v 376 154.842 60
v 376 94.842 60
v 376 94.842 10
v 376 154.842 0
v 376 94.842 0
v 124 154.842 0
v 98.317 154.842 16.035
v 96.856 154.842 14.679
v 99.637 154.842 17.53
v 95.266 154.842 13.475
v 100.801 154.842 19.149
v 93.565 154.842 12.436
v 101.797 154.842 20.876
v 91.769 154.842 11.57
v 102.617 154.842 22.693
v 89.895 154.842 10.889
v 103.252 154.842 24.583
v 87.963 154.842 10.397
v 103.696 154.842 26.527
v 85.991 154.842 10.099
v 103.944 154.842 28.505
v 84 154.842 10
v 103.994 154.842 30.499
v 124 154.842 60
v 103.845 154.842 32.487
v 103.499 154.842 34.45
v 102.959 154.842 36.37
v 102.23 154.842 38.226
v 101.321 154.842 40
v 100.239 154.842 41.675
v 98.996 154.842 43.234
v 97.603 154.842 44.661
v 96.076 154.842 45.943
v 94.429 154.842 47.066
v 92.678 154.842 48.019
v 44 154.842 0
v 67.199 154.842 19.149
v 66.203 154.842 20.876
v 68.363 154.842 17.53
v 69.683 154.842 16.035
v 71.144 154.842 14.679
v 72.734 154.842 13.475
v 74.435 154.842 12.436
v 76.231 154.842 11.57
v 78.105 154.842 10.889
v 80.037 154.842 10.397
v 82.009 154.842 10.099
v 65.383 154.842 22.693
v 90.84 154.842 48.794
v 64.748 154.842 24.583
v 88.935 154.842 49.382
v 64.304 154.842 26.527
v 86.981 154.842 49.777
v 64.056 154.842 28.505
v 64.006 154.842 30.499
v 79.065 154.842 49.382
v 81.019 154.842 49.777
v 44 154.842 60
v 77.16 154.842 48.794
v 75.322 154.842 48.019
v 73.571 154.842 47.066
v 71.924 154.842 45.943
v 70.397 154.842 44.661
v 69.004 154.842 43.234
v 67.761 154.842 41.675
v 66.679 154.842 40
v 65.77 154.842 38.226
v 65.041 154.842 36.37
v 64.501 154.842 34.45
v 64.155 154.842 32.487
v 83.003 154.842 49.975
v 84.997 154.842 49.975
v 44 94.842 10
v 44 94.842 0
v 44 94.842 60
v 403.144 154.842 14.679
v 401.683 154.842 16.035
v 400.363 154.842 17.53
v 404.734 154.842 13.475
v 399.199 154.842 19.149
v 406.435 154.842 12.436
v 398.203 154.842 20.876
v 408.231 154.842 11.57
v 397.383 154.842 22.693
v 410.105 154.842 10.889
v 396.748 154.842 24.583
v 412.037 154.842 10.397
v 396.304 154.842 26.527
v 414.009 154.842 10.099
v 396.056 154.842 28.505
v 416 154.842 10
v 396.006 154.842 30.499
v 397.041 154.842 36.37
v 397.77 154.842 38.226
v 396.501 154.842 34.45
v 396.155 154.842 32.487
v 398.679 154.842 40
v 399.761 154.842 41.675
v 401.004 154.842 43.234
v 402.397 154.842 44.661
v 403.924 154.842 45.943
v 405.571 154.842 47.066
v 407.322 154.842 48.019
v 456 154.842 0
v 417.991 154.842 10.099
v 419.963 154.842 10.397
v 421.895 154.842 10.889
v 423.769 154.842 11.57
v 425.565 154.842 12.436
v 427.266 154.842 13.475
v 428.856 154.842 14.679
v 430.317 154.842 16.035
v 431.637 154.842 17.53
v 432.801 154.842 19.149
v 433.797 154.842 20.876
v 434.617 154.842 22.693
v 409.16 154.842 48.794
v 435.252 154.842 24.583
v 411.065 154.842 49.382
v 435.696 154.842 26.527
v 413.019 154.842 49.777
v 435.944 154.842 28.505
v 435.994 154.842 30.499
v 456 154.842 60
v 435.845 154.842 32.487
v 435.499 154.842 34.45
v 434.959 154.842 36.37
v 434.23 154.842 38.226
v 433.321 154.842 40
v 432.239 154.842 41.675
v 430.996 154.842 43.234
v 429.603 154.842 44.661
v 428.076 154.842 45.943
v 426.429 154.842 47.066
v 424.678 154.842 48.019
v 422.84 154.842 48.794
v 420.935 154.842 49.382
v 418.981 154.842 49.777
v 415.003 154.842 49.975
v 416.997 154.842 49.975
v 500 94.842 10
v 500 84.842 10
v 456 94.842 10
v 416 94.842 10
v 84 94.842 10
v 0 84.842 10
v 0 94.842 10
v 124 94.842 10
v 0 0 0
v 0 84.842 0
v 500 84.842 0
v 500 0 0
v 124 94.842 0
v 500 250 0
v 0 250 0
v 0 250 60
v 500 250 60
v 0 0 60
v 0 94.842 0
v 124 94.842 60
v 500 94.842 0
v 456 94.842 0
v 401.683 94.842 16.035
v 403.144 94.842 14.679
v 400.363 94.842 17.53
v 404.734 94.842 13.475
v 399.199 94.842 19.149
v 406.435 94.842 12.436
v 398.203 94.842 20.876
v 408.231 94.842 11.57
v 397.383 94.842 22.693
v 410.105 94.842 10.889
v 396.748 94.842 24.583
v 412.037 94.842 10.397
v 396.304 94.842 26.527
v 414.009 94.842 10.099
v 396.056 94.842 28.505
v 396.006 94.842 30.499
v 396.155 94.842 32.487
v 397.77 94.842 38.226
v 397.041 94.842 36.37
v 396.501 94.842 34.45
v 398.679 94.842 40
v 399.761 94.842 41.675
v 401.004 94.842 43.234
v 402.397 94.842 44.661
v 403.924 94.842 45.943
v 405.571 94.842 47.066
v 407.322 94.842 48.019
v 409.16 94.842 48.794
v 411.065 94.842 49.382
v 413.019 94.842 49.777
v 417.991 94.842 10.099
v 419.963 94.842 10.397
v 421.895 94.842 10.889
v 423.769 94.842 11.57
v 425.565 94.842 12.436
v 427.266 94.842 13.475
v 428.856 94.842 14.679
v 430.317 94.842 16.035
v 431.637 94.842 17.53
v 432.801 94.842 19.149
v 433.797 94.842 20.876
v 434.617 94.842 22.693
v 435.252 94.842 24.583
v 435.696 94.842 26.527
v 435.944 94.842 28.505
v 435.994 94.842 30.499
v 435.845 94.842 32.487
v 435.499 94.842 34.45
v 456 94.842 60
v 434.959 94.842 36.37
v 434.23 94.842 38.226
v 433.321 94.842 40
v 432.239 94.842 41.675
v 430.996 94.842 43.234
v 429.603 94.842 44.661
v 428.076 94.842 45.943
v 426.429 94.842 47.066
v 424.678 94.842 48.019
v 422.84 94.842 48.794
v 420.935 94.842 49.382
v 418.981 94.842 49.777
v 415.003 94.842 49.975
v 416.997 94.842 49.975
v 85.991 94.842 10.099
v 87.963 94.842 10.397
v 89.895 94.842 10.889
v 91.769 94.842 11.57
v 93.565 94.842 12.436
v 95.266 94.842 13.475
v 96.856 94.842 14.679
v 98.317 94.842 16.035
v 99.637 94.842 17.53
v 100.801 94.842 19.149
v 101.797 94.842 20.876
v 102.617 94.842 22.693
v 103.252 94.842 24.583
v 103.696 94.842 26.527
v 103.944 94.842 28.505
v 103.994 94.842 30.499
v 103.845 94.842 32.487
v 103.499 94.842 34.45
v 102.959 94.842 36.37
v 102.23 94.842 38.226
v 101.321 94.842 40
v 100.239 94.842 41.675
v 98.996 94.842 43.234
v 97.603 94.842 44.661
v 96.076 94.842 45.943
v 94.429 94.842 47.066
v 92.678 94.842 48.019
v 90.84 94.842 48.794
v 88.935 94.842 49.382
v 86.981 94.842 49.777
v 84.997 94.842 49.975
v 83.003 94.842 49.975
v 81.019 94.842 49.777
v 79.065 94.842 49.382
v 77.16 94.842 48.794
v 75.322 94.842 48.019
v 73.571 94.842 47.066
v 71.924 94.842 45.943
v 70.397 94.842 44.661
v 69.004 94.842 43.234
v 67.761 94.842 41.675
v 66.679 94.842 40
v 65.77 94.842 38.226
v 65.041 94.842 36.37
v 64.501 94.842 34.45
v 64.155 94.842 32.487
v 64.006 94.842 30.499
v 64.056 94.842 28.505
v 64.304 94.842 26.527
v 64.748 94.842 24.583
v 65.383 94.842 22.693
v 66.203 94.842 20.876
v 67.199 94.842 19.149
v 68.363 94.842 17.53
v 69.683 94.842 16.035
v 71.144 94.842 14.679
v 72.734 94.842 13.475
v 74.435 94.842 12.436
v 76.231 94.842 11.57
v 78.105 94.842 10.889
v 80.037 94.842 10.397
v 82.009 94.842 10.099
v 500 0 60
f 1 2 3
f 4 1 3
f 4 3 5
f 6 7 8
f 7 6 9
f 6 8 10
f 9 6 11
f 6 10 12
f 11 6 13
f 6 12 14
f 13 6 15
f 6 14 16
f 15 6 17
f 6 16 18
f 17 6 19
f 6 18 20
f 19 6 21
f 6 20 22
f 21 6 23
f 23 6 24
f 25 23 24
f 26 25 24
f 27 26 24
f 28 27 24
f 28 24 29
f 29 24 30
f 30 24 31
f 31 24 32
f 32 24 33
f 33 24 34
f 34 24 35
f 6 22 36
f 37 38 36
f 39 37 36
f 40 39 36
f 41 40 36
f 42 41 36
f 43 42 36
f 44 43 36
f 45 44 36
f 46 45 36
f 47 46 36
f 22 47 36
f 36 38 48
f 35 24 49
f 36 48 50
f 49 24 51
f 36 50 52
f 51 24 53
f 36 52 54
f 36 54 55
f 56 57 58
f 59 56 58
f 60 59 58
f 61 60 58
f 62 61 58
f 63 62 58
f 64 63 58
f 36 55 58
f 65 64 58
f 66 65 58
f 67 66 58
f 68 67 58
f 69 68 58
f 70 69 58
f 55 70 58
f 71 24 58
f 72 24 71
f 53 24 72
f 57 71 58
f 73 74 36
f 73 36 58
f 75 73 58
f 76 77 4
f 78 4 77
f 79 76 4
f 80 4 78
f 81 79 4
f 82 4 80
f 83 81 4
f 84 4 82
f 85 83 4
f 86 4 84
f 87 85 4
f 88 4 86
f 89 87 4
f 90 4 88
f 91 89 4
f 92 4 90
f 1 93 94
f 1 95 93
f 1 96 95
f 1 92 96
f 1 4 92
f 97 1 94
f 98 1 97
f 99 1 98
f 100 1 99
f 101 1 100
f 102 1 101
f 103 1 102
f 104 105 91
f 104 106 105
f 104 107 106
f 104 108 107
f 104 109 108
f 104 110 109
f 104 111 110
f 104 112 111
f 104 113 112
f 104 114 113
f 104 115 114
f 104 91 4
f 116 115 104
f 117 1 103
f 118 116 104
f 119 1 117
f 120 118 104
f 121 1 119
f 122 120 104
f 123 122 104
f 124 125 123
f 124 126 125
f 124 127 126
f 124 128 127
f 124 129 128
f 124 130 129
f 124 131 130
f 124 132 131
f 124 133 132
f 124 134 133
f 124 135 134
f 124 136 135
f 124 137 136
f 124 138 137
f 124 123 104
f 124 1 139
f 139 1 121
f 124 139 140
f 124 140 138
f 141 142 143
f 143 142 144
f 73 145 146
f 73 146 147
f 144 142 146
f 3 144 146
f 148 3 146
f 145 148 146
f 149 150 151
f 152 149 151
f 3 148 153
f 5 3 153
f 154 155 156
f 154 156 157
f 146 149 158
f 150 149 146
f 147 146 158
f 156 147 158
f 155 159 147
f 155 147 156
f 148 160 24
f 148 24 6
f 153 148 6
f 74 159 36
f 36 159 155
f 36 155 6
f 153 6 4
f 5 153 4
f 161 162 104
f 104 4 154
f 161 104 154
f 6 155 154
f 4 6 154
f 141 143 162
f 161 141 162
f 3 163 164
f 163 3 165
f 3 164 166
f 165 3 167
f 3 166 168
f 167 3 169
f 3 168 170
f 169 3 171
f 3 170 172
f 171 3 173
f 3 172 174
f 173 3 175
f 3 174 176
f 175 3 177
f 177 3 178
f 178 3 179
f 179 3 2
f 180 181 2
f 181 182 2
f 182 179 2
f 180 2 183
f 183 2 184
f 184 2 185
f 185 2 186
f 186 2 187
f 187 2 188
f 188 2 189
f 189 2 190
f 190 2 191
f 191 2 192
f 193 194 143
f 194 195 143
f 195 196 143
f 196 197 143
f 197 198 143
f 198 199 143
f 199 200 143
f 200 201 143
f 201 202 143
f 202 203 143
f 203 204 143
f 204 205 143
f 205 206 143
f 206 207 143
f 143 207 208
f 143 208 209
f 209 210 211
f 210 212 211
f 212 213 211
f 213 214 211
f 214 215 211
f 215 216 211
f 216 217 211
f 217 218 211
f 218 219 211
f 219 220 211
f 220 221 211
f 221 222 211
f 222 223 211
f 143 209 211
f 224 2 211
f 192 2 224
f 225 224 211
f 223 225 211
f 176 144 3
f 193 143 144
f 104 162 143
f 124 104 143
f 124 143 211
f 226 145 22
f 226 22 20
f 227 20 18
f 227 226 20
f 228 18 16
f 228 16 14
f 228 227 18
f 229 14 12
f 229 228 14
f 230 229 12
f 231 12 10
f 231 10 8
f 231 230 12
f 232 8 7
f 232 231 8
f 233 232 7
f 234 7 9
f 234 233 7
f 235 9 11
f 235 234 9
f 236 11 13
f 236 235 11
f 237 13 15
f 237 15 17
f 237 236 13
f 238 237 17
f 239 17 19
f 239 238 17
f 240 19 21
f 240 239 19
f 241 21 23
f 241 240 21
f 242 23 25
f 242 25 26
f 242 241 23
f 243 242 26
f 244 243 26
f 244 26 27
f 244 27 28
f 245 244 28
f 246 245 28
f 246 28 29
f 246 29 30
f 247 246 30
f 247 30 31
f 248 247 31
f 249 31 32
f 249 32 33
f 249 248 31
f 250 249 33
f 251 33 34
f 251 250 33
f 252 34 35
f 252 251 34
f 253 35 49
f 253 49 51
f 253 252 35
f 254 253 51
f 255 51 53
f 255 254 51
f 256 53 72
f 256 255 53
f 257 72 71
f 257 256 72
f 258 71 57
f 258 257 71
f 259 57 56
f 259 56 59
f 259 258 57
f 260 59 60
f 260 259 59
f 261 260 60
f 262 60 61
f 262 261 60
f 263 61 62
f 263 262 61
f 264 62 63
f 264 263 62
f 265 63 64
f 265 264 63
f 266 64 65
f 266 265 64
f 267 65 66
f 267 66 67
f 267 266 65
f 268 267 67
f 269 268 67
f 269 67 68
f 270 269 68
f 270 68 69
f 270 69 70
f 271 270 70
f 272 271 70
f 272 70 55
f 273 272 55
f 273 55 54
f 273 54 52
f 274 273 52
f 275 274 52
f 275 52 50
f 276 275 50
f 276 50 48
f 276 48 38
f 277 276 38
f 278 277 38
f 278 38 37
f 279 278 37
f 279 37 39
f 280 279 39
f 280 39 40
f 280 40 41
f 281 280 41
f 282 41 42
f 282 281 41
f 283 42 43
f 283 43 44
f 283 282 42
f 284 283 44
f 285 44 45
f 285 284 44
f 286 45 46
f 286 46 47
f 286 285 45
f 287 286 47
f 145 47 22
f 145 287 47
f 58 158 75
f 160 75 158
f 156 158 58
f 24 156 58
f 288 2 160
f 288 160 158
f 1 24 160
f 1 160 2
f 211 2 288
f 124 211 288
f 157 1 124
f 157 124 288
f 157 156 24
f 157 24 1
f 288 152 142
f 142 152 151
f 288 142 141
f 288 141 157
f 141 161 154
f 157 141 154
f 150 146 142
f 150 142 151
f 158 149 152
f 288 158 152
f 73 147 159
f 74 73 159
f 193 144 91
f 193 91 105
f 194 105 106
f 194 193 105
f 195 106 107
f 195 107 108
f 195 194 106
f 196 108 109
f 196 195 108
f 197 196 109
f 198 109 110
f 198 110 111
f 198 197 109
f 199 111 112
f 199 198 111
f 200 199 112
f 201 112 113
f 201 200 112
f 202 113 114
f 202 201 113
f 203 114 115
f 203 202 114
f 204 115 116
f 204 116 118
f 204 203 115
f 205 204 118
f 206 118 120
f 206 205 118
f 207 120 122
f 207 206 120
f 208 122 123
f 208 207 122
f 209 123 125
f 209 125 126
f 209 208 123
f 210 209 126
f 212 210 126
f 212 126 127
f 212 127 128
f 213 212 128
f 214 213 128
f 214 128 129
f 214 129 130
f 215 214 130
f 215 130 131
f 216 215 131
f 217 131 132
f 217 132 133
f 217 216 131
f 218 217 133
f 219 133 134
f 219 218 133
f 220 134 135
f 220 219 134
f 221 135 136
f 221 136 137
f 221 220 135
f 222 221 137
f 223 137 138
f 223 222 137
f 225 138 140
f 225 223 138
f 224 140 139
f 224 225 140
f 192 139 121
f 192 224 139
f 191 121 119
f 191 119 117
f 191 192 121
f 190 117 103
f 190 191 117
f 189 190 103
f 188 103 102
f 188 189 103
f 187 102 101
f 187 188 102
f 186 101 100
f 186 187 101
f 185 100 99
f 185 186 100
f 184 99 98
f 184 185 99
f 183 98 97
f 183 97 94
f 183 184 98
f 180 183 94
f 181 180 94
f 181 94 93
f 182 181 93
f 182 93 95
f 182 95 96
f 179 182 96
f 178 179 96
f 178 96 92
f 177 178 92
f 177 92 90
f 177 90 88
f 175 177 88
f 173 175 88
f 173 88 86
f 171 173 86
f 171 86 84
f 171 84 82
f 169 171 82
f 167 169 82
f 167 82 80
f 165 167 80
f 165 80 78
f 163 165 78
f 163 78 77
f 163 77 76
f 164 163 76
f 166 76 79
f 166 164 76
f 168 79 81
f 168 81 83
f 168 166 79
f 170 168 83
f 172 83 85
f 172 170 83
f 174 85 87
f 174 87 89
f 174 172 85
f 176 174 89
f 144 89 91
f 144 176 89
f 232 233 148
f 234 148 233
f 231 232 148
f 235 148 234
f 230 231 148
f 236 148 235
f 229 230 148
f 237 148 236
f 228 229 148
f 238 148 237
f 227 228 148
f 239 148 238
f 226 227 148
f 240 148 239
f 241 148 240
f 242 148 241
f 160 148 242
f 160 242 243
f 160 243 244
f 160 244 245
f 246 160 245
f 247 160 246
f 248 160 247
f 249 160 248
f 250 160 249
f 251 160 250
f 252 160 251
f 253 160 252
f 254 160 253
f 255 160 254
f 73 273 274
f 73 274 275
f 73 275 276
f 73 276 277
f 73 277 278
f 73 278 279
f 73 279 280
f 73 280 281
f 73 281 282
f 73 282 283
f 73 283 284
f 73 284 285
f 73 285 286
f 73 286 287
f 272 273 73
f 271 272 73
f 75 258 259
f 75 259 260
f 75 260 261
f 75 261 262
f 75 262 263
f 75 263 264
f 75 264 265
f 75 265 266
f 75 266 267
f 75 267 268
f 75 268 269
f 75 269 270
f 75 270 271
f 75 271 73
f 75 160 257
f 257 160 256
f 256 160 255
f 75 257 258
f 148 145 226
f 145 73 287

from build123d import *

# Parameters (mm, degrees)
SKETCH_1_W          = 500
SKETCH_1_H          = 250
EXTRUDE_1_DEPTH     = 60
SKETCH_5_W          = 10
SKETCH_5_H          = 10
CUT_EXTRUDE_3_DEPTH = 500
CUT_EXTRUDE_START   = -94.842468
SKETCH_2_R          = 20
CUT_EXTRUDE_4_DEPTH = 60


with BuildPart() as part:
    # 草图1 → 凸台-拉伸1 (new body)
    with BuildSketch(Plane.XY):
        with Locations((250, 125)):
            Rectangle(SKETCH_1_W, SKETCH_1_H)
    extrude(amount=EXTRUDE_1_DEPTH)

    # 草图5 → 切除-拉伸3 (cut)
    with BuildSketch(Plane(origin=(0, 0, 0), x_dir=(0, 0, -1), z_dir=(1, 0, 0))):
        with Locations((-5, 89.842468298)):
            Rectangle(SKETCH_5_W, SKETCH_5_H)
    extrude(amount=CUT_EXTRUDE_3_DEPTH, mode=Mode.SUBTRACT)

    # 草图2 → 切除-拉伸4 (cut)
    # profile 1 of 2: a face of its own
    with BuildSketch(Plane.XZ.offset(CUT_EXTRUDE_START)):
        Polygon((100, 60), (124, 60), (124, 0), (44, 0), (44, 60), align=None)
        with Locations(Location((84, 30, 0), (0, 0, 270))):
            Circle(SKETCH_2_R, mode=Mode.SUBTRACT)
    # profile 2 of 2: a face of its own
    with BuildSketch(Plane.XZ.offset(CUT_EXTRUDE_START)):
        Polygon((456, 60), (400, 60), (376, 60), (376, 0), (456, 0), align=None)
        with Locations(Location((416, 30, 0), (0, 0, 270))):
            Circle(SKETCH_2_R, mode=Mode.SUBTRACT)
    extrude(amount=-CUT_EXTRUDE_4_DEPTH, mode=Mode.SUBTRACT)


solid = part.part
